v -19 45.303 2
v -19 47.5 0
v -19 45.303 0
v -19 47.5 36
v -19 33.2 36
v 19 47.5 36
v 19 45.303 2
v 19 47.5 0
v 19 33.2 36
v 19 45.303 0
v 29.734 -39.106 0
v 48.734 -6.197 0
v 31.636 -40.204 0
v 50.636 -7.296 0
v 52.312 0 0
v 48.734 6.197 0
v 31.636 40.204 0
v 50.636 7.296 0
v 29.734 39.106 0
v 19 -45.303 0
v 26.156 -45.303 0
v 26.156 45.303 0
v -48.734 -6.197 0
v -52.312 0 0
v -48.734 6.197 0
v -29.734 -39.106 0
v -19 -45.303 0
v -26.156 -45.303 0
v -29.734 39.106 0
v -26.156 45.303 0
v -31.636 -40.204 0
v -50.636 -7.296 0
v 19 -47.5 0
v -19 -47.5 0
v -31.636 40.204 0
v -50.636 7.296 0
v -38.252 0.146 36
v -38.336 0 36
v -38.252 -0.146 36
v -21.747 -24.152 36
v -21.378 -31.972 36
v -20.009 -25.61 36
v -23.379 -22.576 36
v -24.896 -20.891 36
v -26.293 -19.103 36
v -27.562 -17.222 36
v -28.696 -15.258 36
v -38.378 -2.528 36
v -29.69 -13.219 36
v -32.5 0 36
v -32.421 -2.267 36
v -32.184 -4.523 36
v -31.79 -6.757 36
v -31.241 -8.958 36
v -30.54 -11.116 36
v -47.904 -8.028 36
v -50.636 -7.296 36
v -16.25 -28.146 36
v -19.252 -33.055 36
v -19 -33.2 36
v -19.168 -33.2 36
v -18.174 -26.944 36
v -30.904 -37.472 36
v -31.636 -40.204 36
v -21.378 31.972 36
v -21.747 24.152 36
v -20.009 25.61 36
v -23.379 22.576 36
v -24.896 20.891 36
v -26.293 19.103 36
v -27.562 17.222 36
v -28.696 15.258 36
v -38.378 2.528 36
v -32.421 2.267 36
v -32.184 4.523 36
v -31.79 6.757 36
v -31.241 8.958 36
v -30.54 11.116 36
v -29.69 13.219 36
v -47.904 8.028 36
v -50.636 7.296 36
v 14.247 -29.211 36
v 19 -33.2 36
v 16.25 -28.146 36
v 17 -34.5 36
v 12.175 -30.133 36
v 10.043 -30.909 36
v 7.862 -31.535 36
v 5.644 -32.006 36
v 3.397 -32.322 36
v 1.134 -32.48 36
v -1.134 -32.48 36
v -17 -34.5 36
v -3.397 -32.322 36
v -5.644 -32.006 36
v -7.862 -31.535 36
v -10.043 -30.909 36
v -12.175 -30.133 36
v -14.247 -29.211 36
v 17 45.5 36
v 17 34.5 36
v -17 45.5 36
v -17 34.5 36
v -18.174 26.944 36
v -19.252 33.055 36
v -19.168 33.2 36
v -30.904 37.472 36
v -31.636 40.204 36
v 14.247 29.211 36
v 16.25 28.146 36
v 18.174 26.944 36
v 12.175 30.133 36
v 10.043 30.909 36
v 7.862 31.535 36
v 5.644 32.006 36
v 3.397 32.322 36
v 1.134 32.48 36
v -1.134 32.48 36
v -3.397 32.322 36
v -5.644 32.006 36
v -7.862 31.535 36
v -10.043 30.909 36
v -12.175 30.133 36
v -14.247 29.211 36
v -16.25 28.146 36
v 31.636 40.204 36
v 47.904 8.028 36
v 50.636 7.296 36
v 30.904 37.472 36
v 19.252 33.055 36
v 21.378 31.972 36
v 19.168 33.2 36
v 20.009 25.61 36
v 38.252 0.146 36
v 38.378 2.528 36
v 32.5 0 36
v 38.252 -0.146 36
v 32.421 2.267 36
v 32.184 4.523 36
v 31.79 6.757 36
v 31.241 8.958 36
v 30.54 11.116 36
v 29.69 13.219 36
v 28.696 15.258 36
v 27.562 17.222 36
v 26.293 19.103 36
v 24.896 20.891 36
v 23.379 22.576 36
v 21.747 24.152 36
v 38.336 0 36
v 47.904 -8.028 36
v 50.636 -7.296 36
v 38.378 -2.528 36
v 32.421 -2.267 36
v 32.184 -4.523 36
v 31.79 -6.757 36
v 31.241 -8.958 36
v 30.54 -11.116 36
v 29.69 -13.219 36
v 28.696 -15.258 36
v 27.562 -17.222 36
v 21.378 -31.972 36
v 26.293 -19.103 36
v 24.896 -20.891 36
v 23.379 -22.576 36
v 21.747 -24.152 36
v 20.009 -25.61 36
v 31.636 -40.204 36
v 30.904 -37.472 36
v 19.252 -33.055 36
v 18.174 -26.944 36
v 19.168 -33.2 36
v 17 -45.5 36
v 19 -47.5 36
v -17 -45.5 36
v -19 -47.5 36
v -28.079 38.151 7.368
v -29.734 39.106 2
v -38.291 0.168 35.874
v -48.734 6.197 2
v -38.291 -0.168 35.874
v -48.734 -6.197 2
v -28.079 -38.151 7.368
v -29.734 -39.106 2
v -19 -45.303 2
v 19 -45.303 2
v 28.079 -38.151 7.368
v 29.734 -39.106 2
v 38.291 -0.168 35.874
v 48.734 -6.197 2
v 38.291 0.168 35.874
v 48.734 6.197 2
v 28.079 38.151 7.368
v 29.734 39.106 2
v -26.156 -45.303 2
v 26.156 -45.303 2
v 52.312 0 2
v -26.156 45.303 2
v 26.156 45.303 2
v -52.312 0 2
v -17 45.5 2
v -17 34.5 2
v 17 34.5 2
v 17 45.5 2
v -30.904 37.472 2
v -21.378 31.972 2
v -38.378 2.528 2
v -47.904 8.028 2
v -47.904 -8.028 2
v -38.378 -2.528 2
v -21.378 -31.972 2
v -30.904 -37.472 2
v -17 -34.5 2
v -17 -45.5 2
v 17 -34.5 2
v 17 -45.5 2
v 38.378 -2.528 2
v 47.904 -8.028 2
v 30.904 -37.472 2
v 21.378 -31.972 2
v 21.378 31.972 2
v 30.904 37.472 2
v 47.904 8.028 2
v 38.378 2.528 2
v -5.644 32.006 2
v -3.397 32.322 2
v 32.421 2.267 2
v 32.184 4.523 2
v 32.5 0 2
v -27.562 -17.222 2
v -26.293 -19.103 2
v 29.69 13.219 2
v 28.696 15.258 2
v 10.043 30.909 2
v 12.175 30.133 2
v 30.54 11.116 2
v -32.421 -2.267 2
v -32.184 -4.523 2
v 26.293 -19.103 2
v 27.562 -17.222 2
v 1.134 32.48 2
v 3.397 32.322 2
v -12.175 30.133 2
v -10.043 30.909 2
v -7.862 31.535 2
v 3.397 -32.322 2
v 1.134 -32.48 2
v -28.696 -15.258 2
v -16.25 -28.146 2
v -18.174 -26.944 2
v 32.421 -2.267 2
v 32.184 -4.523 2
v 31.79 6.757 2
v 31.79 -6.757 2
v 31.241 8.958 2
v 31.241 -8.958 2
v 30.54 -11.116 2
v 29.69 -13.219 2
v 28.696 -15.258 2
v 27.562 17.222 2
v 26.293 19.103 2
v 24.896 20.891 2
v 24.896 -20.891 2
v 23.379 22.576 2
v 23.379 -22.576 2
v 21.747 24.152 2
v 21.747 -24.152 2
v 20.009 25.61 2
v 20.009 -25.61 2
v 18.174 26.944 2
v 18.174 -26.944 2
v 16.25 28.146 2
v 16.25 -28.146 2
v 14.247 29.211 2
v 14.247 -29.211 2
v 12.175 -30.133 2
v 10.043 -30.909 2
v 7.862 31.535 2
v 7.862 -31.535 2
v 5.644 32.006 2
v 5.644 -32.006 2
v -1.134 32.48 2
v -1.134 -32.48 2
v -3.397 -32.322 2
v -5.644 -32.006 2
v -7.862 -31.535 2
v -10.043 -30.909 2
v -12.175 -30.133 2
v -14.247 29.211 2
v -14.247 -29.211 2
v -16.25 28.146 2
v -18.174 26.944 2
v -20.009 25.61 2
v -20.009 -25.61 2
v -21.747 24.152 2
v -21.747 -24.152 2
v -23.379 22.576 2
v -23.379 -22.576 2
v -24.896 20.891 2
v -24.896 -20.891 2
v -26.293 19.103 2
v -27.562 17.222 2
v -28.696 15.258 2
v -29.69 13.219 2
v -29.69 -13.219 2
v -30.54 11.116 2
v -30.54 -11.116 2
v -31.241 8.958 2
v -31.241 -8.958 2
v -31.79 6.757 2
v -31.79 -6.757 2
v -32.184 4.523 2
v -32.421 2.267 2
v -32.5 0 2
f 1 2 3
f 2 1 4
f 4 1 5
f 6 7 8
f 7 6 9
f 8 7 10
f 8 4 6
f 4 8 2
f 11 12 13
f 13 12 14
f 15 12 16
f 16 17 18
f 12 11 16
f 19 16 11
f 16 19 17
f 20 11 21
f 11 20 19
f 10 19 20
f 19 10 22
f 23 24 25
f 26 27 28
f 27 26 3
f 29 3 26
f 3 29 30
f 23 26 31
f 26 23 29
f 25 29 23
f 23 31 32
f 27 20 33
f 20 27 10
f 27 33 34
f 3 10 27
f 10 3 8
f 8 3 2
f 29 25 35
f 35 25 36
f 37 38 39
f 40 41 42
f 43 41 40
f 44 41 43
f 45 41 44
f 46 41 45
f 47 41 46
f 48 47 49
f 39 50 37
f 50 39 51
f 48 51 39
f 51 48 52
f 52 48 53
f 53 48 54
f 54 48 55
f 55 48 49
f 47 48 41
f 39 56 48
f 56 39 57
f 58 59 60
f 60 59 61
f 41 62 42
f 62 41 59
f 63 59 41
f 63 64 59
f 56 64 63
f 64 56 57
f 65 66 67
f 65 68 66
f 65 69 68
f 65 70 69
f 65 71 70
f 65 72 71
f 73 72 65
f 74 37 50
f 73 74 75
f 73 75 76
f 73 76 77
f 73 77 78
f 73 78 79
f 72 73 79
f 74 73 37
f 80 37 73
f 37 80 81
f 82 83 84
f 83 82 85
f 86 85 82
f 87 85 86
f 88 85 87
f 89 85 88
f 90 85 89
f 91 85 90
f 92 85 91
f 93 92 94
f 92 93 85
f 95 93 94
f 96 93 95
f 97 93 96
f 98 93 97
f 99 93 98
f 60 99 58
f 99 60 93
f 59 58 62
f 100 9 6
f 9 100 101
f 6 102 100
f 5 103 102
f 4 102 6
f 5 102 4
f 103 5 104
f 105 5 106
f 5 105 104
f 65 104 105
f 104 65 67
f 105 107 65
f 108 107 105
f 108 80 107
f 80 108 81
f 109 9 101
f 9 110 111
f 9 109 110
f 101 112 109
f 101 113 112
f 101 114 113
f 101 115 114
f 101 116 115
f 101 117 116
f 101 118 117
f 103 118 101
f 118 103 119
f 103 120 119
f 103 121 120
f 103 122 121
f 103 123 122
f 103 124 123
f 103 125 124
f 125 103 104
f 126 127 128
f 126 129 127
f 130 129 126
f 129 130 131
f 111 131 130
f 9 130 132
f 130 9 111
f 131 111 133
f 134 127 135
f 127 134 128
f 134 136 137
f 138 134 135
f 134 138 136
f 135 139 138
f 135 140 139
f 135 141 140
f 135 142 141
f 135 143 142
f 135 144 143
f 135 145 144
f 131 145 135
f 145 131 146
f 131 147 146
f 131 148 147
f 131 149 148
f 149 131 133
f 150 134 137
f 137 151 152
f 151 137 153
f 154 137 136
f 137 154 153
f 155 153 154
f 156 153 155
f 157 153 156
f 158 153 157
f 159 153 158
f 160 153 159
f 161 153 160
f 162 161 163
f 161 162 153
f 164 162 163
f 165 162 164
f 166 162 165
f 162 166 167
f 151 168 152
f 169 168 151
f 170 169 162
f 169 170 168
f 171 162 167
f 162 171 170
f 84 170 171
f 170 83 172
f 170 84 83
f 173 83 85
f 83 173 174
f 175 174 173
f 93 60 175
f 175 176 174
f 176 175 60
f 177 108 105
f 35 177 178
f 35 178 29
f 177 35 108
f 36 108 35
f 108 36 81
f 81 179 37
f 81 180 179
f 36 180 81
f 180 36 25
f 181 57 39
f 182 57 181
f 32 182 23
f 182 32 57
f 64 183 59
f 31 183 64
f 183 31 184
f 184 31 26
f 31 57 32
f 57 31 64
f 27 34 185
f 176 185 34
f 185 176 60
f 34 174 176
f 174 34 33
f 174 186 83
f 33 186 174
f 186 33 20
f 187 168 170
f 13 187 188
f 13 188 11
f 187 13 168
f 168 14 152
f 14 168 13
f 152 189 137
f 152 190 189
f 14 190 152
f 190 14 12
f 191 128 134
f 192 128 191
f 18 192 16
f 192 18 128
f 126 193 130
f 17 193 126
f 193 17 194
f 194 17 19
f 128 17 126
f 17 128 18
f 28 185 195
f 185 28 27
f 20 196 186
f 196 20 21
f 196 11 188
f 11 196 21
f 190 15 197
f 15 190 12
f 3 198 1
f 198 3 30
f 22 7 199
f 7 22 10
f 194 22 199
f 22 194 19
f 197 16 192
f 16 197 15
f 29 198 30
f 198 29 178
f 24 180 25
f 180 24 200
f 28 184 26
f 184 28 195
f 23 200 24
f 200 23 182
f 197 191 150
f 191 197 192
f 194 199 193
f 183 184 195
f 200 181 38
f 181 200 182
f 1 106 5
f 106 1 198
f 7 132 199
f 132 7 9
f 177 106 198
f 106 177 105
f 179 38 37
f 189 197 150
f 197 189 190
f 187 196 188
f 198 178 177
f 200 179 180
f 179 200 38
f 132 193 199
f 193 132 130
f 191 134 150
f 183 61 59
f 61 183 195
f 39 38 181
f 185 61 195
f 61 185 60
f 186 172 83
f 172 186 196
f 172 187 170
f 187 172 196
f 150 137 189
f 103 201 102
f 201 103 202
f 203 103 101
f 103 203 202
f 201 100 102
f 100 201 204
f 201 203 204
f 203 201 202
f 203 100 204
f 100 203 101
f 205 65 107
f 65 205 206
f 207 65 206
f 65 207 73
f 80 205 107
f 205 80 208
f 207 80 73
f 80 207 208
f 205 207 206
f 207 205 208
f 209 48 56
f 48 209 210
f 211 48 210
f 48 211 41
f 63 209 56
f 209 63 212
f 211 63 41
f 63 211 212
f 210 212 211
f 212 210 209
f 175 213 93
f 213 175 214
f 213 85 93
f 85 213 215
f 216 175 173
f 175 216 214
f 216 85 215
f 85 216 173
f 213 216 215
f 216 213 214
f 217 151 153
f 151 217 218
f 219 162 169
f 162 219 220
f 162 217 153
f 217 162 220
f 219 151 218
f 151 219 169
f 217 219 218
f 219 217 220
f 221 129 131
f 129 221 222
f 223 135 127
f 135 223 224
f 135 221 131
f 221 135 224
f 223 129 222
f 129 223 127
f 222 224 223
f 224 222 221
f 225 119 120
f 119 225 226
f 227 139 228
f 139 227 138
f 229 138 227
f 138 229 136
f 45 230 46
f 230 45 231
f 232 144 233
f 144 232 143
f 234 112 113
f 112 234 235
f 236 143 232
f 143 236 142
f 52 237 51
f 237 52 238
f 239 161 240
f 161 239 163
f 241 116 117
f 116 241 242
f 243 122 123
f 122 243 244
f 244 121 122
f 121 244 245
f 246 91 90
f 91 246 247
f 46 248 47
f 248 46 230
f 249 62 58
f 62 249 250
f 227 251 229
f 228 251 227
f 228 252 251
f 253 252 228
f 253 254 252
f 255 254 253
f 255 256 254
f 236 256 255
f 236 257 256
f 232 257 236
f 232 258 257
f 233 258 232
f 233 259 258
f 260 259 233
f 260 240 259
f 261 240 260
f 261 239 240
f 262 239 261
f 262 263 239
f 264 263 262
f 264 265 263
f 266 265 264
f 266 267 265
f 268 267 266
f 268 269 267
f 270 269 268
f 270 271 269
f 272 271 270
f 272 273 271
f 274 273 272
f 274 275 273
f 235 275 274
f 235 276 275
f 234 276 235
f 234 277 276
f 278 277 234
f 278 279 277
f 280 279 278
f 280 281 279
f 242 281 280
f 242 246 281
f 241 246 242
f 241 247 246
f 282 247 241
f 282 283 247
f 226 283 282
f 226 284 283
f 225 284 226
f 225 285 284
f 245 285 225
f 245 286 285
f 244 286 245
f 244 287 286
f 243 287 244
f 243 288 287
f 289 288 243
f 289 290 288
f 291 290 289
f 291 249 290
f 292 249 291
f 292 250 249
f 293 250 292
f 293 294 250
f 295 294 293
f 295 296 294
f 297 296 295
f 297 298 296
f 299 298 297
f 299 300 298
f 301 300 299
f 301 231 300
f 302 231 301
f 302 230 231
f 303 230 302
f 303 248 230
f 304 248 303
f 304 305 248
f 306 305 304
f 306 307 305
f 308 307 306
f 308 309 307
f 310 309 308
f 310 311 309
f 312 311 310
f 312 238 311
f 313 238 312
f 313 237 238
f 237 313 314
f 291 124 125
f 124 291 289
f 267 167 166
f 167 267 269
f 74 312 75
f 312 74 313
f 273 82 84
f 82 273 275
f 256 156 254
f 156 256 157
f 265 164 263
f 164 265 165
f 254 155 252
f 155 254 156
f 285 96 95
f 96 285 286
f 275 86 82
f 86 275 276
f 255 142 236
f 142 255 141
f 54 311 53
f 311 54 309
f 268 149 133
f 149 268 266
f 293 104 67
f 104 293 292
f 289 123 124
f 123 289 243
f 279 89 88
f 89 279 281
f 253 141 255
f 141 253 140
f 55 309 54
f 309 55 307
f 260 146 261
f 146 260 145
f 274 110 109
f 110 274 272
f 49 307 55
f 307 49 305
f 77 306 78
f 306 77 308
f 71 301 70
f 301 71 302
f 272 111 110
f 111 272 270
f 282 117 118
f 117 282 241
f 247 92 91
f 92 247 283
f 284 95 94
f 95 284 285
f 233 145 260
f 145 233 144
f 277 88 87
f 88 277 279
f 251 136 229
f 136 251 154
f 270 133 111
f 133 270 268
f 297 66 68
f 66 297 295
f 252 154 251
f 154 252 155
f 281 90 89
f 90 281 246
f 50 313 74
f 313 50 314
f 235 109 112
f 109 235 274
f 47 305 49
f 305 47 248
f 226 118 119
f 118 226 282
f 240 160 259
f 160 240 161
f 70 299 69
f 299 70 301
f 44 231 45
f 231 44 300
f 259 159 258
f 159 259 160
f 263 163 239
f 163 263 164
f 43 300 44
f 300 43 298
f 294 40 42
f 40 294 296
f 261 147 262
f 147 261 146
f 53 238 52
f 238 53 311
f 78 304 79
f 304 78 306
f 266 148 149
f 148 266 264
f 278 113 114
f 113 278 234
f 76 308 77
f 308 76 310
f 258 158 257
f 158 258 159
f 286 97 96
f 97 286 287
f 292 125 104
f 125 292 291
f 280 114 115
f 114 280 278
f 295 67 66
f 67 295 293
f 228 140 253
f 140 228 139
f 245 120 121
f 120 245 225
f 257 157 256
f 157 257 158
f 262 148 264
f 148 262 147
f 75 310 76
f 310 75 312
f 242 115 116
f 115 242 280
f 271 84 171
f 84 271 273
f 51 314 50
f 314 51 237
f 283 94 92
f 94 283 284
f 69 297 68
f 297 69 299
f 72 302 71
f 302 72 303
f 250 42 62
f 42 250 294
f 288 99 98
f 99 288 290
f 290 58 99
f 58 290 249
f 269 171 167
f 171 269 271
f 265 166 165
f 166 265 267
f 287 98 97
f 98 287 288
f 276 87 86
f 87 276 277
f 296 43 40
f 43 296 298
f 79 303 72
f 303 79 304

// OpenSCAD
eps = 0.01;
$fn = 90;
tol = 0.2;

// basic pareters
wt = 2;

// contact len shelf dimensions
cls_x = 34;
cls_y = 34;
cls_z = 11;

// contact len solution bottle dimensions
sb_d = 65;
sb_h = cls_x;


// contact len shelf
/*
module cl_shelf()
{
    _a = cls_x+2*wt;
    _b = cls_y+wt;
    _c = cls_z+2*wt;
    translate([-_a/2,0,0])
        difference()
        {
            cube([_a,_b,_c]);
            translate([wt,wt,wt])
                cube([cls_x,cls_y+eps,cls_z]);
        }
}
*/

/*
module cl_holder()
{
    
    n_cl = 5;
    // shelfs
    difference()
    {
        union()
        {
            translate([0,sb_d/2+((cls_z+wt)*2/sqrt(2))/2,0])
            {
                for(i=[0:n_cl])
                {
                    z_off = i*(cls_z+wt)*2/sqrt(2);
                    translate([0,0,z_off])
                        rotate([45,0,0])
                            cl_shelf();
                }
                
                // side supports
                translate([-cls_x/2-wt,-cls_z,0])
                    cube([wt,cls_z,
                          ((n_cl+0.5)*(cls_z+wt)+0.5*wt)*2/sqrt(2)]);
                translate([cls_x/2,-cls_z,0])
                    cube([wt,cls_z,
                          ((n_cl+0.5)*(cls_z+wt)+0.5*wt)*2/sqrt(2)]);
            }
            // lower part
            _R = sqrt(45*45+(45/2)*(45/2))+wt;
            _r = sqrt((sb_d/2)*(sb_d/2) + (sb_d/4)*(sb_d/4))+wt;
            cylinder(r=_R,h=wt,$fn=6);
            translate([0,0,wt])
                cylinder(r1=_R,r2=_r,h=sb_h,$fn=6);
        }
        translate([0,0,wt])
            cylinder(d=sb_d,h=sb_h+eps);
    }
    %cylinder(d=90);
    

        
}
*/

module cl_holder()
{
    
    n_cl = 5;
    // shelfs
    difference()
    {
        _a = cls_x+2*wt;
        _b = cls_y+wt;
        _c = cls_z+2*wt;
        //translate([-_a/2,0,0])
        //    difference()
        //    {
        //        cube([_a,_b,_c]);

        //    }
        union()
        {
        
            for(i=[0:n_cl])
            {
                z_off = 0;
                y_off = sb_d/2+cls_z+2*wt;
                rotate([0,0,i*60])
                    translate([-_a/2,y_off,z_off])
                        rotate([90,0,0])
                            //cl_shelf();
                            cube([_a,_b,_c]);
            }
            
            // lower part
            _R = sqrt(45*45+(45/2)*(45/2))+wt;
            _r = sqrt((sb_d/2)*(sb_d/2) + (sb_d/4)*(sb_d/4))+wt;
            cylinder(r=_R,h=wt,$fn=6);
                translate([0,0,wt])
            cylinder(r1=_R,r2=_r,h=sb_h,$fn=6);    
        }
        
        for(i=[0:n_cl])
        {   
            z_off = 0;
            y_off = sb_d/2+cls_z+2*wt;
            rotate([0,0,i*60])
                    translate([-_a/2,y_off,z_off])
                        rotate([90,0,0])
                            translate([wt,wt,wt])
                                cube([cls_x,cls_y+eps,cls_z]);
        }
            
        translate([0,0,wt])
            cylinder(d=sb_d,h=100);
    }
    %cylinder(d=90);
}

cl_holder();
    
